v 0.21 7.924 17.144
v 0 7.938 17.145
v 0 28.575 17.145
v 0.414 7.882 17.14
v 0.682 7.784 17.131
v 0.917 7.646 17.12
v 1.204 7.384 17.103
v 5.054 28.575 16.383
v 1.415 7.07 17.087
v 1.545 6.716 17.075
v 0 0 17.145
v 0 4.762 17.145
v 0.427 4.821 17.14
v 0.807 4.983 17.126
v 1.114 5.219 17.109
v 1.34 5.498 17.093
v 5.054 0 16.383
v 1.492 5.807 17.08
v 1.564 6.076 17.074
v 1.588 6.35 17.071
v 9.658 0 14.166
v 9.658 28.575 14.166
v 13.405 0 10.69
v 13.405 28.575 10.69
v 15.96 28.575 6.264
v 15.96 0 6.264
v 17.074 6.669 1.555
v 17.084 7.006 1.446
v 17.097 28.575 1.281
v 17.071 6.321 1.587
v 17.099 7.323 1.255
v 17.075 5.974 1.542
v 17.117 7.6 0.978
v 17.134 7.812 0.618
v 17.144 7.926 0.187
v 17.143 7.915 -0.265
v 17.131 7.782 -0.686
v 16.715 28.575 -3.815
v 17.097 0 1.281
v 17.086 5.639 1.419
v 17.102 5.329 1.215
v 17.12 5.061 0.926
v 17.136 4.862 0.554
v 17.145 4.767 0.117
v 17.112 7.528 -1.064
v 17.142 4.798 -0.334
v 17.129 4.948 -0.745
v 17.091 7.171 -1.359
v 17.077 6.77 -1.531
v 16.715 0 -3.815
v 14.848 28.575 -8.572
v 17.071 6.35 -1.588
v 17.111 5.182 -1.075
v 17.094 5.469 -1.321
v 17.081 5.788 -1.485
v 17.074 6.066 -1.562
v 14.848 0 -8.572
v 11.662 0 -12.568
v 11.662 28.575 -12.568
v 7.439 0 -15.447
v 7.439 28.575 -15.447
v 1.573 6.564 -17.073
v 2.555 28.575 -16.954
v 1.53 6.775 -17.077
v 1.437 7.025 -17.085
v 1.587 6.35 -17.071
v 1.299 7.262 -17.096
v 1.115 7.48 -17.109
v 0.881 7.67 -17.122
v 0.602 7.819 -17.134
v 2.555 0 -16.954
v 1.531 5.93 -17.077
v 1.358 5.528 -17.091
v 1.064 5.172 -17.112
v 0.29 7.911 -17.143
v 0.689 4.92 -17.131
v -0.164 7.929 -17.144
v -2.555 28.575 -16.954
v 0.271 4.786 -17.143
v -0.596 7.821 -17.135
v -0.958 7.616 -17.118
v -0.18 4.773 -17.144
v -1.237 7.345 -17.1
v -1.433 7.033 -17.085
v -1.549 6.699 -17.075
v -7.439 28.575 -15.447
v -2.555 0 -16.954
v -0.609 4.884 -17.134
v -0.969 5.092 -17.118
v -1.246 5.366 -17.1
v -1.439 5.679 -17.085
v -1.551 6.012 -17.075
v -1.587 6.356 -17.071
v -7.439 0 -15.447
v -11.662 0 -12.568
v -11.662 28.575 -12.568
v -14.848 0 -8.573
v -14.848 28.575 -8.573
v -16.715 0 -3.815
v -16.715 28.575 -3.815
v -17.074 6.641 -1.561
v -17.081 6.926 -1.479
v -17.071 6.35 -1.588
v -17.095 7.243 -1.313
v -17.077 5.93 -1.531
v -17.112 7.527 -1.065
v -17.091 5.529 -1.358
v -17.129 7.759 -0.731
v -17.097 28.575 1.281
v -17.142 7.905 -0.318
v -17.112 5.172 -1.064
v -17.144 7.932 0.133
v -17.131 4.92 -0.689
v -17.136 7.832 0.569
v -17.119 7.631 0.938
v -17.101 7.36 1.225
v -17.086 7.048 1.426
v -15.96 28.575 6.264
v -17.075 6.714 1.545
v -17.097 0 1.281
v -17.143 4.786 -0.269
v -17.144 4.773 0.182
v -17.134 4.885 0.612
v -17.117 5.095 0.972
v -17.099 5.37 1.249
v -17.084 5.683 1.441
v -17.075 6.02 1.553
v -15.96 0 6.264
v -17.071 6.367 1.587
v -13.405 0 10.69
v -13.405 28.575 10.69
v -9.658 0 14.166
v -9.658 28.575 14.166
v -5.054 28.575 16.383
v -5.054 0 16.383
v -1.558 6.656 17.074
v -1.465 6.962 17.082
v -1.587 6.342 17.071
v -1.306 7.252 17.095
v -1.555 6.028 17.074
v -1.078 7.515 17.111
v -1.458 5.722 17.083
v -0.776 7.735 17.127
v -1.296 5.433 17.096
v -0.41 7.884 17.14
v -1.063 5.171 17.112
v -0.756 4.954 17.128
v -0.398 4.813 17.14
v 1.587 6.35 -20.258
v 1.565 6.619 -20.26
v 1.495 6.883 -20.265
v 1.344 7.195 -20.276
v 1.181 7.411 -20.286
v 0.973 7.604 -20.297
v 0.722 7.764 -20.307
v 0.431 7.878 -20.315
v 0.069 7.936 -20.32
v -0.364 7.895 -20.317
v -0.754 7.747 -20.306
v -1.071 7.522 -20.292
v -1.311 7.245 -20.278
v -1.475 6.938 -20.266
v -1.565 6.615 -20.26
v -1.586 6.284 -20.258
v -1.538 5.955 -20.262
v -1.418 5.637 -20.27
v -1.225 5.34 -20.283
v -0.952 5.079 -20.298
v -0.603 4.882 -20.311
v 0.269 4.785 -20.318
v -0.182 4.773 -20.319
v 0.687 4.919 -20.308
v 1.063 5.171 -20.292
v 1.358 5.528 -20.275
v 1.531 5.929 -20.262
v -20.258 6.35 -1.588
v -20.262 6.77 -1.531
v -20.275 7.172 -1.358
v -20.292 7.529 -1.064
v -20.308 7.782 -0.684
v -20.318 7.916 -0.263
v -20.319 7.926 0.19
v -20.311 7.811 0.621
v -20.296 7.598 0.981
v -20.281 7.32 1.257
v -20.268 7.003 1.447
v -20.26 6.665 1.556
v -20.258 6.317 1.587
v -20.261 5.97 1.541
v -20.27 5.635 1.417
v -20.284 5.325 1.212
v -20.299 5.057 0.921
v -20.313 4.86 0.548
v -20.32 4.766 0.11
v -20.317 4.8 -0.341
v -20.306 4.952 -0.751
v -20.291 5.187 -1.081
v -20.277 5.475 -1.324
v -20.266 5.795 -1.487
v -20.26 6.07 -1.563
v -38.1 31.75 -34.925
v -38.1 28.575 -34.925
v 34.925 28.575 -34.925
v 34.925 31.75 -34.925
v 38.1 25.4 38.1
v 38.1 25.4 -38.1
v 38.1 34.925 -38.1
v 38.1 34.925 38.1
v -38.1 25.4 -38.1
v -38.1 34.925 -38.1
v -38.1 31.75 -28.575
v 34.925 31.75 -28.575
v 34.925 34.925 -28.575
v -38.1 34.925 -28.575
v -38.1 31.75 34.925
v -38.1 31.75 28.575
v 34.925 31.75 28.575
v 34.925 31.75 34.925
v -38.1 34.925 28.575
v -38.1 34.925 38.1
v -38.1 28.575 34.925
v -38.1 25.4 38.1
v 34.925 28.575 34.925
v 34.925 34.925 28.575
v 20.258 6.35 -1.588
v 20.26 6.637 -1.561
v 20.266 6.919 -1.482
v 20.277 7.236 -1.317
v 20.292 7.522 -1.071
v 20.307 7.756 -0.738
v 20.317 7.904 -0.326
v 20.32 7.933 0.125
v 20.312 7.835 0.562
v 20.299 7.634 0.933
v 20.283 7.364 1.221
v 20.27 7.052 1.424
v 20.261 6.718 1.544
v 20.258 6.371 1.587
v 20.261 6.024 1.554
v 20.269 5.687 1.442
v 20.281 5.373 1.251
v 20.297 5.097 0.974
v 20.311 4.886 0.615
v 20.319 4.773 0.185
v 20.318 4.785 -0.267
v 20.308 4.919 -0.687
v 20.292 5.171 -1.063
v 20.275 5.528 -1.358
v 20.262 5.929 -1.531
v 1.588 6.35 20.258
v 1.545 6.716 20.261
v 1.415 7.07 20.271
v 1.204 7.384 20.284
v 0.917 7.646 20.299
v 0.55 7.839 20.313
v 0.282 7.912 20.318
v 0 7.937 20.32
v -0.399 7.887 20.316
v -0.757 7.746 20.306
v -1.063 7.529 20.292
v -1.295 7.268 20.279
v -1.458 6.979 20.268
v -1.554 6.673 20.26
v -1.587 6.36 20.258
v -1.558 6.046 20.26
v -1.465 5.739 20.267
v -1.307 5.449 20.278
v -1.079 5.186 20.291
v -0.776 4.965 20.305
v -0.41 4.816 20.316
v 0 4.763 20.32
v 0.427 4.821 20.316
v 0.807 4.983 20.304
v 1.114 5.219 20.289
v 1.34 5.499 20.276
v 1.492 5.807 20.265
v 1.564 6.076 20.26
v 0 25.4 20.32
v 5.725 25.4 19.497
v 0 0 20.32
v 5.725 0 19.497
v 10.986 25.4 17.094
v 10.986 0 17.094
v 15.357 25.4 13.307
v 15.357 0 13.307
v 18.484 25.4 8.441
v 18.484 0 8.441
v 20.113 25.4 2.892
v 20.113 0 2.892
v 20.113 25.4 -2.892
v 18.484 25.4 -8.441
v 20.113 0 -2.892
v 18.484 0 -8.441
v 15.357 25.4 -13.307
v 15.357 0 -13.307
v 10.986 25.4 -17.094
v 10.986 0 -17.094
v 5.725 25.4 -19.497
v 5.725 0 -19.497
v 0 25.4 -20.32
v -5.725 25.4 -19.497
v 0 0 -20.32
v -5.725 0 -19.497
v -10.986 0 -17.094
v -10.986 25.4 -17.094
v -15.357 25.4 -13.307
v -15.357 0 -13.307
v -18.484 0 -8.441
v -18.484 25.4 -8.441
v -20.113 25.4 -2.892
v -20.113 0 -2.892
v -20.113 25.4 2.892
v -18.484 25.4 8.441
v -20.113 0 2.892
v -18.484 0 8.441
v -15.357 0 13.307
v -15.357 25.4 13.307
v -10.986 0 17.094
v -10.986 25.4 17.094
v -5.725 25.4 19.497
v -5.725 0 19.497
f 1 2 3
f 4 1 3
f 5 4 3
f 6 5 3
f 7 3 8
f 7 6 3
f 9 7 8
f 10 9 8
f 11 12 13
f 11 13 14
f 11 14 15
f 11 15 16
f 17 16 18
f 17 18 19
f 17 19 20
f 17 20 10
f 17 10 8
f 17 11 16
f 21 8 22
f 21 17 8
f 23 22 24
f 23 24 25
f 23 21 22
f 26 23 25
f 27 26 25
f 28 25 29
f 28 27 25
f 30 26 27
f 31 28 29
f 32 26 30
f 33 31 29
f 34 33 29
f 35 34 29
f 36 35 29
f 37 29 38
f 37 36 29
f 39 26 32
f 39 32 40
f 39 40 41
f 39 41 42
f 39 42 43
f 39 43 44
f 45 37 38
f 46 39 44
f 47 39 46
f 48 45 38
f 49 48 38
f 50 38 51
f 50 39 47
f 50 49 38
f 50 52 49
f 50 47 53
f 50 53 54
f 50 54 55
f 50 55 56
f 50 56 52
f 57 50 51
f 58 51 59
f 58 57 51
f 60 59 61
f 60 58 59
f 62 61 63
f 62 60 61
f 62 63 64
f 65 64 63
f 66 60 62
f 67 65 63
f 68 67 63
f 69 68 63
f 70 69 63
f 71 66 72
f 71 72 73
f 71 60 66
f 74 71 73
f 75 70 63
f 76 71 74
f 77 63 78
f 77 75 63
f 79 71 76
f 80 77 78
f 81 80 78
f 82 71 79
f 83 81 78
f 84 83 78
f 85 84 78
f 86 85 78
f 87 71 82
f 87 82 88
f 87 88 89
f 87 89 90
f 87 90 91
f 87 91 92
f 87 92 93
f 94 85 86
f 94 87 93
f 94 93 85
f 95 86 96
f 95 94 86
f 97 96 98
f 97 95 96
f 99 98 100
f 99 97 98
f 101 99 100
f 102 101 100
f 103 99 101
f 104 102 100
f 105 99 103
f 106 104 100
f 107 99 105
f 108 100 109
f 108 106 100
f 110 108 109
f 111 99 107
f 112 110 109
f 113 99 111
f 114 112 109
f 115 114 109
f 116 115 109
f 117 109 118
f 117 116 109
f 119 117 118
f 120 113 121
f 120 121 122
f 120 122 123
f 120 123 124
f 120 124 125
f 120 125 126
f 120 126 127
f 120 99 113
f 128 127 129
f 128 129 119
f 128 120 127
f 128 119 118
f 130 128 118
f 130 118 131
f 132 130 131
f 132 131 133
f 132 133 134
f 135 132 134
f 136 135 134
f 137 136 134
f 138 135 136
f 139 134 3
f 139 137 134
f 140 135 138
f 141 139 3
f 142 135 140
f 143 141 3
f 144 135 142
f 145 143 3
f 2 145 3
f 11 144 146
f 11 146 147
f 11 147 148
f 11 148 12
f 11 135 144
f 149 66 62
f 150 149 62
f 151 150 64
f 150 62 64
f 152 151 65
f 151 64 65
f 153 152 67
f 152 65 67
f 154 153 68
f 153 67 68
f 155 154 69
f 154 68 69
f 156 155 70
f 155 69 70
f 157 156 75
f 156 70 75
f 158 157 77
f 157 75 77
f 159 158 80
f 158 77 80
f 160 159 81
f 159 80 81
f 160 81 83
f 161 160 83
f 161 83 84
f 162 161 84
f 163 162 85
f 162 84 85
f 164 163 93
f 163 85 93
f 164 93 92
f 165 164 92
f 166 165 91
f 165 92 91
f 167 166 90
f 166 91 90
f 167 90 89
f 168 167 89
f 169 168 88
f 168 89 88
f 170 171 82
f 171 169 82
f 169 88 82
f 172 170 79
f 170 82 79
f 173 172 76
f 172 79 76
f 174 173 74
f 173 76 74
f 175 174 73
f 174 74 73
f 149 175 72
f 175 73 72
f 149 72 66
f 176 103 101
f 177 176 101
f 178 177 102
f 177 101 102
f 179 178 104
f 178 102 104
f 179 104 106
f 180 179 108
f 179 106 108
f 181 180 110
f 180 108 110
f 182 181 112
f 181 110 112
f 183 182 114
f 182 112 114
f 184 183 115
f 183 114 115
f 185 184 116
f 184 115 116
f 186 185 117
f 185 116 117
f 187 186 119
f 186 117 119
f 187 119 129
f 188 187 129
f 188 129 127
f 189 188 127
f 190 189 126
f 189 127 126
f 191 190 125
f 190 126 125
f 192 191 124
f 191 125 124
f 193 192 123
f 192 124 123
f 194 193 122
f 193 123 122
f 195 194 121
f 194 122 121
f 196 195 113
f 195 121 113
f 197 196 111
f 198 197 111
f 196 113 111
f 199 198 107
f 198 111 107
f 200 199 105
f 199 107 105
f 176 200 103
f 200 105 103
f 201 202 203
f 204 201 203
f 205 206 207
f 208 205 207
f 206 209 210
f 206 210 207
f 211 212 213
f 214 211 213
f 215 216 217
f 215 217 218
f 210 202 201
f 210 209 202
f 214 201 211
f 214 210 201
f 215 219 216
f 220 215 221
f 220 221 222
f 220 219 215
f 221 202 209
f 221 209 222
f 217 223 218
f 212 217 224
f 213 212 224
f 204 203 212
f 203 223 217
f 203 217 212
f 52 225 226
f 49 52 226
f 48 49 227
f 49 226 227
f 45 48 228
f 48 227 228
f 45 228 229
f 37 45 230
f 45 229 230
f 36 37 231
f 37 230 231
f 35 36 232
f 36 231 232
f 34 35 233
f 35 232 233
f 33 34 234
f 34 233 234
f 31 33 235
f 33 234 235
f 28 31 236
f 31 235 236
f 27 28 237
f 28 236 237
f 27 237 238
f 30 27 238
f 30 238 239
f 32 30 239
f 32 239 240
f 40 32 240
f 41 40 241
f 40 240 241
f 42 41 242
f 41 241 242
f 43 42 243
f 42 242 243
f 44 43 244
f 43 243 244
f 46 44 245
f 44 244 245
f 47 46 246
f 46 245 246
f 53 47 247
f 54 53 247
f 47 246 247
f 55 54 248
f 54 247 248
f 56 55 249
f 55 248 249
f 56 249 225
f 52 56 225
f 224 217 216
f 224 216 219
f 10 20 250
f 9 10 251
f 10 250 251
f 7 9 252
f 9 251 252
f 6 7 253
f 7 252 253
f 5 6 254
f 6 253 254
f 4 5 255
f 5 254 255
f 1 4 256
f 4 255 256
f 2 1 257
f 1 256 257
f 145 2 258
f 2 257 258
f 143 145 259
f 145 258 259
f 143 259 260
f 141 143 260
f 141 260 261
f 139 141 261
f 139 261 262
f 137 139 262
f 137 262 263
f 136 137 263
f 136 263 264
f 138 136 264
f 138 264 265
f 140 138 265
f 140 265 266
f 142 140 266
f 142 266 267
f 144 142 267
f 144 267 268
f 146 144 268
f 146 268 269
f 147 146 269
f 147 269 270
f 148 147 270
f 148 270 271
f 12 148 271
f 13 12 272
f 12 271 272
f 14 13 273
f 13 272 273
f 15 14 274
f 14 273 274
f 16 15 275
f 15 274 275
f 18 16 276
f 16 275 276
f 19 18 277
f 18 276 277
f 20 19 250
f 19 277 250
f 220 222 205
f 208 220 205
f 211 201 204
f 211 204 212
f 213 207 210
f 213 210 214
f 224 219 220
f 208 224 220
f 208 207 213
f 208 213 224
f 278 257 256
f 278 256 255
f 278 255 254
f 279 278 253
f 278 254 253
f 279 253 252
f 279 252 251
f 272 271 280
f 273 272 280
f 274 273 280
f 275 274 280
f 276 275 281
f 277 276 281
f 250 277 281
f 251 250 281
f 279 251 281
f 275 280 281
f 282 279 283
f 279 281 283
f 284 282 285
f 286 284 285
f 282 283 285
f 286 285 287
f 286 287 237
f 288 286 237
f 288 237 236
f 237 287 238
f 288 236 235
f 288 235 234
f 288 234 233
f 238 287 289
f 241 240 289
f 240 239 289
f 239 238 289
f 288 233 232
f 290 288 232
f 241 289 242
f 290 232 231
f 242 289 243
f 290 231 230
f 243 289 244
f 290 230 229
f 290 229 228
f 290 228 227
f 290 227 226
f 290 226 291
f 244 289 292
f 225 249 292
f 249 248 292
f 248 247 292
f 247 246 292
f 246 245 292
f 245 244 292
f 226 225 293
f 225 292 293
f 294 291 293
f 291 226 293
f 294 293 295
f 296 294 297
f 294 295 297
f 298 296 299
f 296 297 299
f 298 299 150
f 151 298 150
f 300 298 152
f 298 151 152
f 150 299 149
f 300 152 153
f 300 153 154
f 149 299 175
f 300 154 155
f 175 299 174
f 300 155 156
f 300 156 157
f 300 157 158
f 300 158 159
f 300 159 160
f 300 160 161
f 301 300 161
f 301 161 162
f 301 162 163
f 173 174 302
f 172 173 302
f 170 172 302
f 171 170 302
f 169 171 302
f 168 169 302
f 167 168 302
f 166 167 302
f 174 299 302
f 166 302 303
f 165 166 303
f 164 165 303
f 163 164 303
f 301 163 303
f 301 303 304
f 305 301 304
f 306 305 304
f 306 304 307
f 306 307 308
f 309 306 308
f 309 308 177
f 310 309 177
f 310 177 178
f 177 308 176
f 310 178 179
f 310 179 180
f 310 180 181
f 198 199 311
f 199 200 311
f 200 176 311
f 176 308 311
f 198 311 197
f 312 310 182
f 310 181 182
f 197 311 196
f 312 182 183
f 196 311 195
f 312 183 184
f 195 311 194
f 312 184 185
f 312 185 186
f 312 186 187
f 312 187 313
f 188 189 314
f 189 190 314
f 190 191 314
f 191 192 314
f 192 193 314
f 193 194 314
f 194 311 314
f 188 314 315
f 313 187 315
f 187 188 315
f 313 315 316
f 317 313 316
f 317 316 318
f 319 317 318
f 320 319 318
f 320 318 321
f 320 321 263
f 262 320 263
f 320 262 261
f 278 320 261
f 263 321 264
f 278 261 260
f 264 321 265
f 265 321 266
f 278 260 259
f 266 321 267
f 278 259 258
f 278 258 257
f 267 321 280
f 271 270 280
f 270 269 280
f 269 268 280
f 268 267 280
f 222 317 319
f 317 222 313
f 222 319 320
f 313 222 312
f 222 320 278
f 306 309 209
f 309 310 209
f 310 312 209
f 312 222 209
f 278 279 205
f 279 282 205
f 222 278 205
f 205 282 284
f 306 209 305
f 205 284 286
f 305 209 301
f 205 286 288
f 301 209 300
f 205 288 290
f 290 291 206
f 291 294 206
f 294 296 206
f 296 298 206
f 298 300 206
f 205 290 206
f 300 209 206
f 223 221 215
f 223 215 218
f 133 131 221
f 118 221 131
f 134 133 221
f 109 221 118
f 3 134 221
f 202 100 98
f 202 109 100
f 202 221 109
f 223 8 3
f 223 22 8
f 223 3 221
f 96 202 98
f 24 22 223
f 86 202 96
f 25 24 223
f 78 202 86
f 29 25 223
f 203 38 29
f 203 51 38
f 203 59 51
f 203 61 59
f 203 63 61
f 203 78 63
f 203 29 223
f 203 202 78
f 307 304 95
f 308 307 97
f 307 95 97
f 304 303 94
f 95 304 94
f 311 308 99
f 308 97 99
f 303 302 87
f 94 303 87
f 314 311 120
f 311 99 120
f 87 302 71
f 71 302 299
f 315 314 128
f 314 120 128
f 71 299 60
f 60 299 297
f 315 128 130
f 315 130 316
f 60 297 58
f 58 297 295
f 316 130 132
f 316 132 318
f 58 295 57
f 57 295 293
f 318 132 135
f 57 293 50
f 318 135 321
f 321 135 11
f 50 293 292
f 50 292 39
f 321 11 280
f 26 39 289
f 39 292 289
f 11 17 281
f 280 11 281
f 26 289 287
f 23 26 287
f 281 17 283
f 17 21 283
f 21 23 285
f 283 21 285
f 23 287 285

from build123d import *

# Parameters (mm, degrees)
SKETCH1_R           = 20.32
SKETCH1_R_2         = 17.145
BOSS_EXTRUDE1_DEPTH = 25.4
SKETCH2_W           = 76.2
SKETCH2_H           = 76.2
SKETCH2_R           = 17.145
BOSS_EXTRUDE2_DEPTH = 3.175
SKETCH3_W           = 76.2
SKETCH3_H           = 3.175
BOSS_EXTRUDE3_DEPTH = 6.35
BOSS_EXTRUDE4_REACH = 91.465
SKETCH4_W           = 3.175
SKETCH4_H           = 6.35
SKETCH5_W           = 6.35
SKETCH5_H           = 3.175
BOSS_EXTRUDE5_DEPTH = 73.025
SKETCH7_R           = 1.5875
CUT_EXTRUDE1_DEPTH  = 65.210401221
CIRPATTERN1_COUNT   = 4


with BuildPart() as part:
    # Sketch1 → Boss-Extrude1 (new body)
    with BuildSketch(Plane(origin=(0, 0, 0), x_dir=(1, 0, 0), z_dir=(0, 1, 0))):
        with Locations(Location((0, 0, 0), (0, 0, 270))):
            Circle(SKETCH1_R)
        with Locations(Location((0, 0, 0), (0, 0, 270))):
            Circle(SKETCH1_R_2, mode=Mode.SUBTRACT)
    extrude(amount=BOSS_EXTRUDE1_DEPTH)

    # Sketch2 → Boss-Extrude2 (add)
    with BuildSketch(Plane(origin=(0, 25.4, 0), x_dir=(1, 0, 0), z_dir=(0, 1, 0))):
        Rectangle(SKETCH2_W, SKETCH2_H)
        with Locations(Location((0, 0, 0), (0, 0, 270))):
            Circle(SKETCH2_R, mode=Mode.SUBTRACT)
    extrude(amount=BOSS_EXTRUDE2_DEPTH)

    # Sketch3 → Boss-Extrude3 (add)
    with BuildSketch(Plane(origin=(0, 28.575, 0), x_dir=(1, 0, 0), z_dir=(0, 1, 0))):
        with Locations((0, 36.5125)):
            Rectangle(SKETCH3_W, SKETCH3_H)
        with Locations((0, -36.5125)):
            Rectangle(SKETCH3_W, SKETCH3_H)
    extrude(amount=BOSS_EXTRUDE3_DEPTH)

    # Sketch4 → Boss-Extrude4 (add, up to next)
    with BuildSketch(Plane.XY.offset(-34.925), mode=Mode.PRIVATE) as boss_extrude4_sk1:
        with Locations((36.5125, 31.75)):
            Rectangle(SKETCH4_W, SKETCH4_H)
    boss_extrude4_tool1 = extrude(boss_extrude4_sk1.sketch, amount=BOSS_EXTRUDE4_REACH, mode=Mode.PRIVATE) - part.part
    add(boss_extrude4_tool1.solids().sort_by_distance((36.5125, 31.75, -34.925))[0])

    # Sketch5 → Boss-Extrude5 (add)
    with BuildSketch(Plane.ZY.offset(-34.925)):
        with Locations((-31.75, 33.3375)):
            Rectangle(SKETCH5_W, SKETCH5_H)
        with Locations((31.75, 33.3375)):
            Rectangle(SKETCH5_W, SKETCH5_H)
    extrude(amount=BOSS_EXTRUDE5_DEPTH)

    # Sketch7 → Cut-Extrude1 (cut, symmetric)
    with BuildSketch(Plane(origin=(0, 0, 0), x_dir=(0, 0, -1), z_dir=(1, 0, 0))):
        with Locations((0, 6.35)):
            Circle(SKETCH7_R)
    cut_extrude1 = extrude(amount=CUT_EXTRUDE1_DEPTH, both=True, mode=Mode.SUBTRACT)

    # CirPattern1: Cut-Extrude1 ×4 about axis
    cirpattern1_axis = Axis((0, 25.4, 0), (0, -1, 0))
    for i in range(1, CIRPATTERN1_COUNT):
        add(cut_extrude1.rotate(cirpattern1_axis, i * 360 / CIRPATTERN1_COUNT), mode=Mode.SUBTRACT)


solid = part.part
